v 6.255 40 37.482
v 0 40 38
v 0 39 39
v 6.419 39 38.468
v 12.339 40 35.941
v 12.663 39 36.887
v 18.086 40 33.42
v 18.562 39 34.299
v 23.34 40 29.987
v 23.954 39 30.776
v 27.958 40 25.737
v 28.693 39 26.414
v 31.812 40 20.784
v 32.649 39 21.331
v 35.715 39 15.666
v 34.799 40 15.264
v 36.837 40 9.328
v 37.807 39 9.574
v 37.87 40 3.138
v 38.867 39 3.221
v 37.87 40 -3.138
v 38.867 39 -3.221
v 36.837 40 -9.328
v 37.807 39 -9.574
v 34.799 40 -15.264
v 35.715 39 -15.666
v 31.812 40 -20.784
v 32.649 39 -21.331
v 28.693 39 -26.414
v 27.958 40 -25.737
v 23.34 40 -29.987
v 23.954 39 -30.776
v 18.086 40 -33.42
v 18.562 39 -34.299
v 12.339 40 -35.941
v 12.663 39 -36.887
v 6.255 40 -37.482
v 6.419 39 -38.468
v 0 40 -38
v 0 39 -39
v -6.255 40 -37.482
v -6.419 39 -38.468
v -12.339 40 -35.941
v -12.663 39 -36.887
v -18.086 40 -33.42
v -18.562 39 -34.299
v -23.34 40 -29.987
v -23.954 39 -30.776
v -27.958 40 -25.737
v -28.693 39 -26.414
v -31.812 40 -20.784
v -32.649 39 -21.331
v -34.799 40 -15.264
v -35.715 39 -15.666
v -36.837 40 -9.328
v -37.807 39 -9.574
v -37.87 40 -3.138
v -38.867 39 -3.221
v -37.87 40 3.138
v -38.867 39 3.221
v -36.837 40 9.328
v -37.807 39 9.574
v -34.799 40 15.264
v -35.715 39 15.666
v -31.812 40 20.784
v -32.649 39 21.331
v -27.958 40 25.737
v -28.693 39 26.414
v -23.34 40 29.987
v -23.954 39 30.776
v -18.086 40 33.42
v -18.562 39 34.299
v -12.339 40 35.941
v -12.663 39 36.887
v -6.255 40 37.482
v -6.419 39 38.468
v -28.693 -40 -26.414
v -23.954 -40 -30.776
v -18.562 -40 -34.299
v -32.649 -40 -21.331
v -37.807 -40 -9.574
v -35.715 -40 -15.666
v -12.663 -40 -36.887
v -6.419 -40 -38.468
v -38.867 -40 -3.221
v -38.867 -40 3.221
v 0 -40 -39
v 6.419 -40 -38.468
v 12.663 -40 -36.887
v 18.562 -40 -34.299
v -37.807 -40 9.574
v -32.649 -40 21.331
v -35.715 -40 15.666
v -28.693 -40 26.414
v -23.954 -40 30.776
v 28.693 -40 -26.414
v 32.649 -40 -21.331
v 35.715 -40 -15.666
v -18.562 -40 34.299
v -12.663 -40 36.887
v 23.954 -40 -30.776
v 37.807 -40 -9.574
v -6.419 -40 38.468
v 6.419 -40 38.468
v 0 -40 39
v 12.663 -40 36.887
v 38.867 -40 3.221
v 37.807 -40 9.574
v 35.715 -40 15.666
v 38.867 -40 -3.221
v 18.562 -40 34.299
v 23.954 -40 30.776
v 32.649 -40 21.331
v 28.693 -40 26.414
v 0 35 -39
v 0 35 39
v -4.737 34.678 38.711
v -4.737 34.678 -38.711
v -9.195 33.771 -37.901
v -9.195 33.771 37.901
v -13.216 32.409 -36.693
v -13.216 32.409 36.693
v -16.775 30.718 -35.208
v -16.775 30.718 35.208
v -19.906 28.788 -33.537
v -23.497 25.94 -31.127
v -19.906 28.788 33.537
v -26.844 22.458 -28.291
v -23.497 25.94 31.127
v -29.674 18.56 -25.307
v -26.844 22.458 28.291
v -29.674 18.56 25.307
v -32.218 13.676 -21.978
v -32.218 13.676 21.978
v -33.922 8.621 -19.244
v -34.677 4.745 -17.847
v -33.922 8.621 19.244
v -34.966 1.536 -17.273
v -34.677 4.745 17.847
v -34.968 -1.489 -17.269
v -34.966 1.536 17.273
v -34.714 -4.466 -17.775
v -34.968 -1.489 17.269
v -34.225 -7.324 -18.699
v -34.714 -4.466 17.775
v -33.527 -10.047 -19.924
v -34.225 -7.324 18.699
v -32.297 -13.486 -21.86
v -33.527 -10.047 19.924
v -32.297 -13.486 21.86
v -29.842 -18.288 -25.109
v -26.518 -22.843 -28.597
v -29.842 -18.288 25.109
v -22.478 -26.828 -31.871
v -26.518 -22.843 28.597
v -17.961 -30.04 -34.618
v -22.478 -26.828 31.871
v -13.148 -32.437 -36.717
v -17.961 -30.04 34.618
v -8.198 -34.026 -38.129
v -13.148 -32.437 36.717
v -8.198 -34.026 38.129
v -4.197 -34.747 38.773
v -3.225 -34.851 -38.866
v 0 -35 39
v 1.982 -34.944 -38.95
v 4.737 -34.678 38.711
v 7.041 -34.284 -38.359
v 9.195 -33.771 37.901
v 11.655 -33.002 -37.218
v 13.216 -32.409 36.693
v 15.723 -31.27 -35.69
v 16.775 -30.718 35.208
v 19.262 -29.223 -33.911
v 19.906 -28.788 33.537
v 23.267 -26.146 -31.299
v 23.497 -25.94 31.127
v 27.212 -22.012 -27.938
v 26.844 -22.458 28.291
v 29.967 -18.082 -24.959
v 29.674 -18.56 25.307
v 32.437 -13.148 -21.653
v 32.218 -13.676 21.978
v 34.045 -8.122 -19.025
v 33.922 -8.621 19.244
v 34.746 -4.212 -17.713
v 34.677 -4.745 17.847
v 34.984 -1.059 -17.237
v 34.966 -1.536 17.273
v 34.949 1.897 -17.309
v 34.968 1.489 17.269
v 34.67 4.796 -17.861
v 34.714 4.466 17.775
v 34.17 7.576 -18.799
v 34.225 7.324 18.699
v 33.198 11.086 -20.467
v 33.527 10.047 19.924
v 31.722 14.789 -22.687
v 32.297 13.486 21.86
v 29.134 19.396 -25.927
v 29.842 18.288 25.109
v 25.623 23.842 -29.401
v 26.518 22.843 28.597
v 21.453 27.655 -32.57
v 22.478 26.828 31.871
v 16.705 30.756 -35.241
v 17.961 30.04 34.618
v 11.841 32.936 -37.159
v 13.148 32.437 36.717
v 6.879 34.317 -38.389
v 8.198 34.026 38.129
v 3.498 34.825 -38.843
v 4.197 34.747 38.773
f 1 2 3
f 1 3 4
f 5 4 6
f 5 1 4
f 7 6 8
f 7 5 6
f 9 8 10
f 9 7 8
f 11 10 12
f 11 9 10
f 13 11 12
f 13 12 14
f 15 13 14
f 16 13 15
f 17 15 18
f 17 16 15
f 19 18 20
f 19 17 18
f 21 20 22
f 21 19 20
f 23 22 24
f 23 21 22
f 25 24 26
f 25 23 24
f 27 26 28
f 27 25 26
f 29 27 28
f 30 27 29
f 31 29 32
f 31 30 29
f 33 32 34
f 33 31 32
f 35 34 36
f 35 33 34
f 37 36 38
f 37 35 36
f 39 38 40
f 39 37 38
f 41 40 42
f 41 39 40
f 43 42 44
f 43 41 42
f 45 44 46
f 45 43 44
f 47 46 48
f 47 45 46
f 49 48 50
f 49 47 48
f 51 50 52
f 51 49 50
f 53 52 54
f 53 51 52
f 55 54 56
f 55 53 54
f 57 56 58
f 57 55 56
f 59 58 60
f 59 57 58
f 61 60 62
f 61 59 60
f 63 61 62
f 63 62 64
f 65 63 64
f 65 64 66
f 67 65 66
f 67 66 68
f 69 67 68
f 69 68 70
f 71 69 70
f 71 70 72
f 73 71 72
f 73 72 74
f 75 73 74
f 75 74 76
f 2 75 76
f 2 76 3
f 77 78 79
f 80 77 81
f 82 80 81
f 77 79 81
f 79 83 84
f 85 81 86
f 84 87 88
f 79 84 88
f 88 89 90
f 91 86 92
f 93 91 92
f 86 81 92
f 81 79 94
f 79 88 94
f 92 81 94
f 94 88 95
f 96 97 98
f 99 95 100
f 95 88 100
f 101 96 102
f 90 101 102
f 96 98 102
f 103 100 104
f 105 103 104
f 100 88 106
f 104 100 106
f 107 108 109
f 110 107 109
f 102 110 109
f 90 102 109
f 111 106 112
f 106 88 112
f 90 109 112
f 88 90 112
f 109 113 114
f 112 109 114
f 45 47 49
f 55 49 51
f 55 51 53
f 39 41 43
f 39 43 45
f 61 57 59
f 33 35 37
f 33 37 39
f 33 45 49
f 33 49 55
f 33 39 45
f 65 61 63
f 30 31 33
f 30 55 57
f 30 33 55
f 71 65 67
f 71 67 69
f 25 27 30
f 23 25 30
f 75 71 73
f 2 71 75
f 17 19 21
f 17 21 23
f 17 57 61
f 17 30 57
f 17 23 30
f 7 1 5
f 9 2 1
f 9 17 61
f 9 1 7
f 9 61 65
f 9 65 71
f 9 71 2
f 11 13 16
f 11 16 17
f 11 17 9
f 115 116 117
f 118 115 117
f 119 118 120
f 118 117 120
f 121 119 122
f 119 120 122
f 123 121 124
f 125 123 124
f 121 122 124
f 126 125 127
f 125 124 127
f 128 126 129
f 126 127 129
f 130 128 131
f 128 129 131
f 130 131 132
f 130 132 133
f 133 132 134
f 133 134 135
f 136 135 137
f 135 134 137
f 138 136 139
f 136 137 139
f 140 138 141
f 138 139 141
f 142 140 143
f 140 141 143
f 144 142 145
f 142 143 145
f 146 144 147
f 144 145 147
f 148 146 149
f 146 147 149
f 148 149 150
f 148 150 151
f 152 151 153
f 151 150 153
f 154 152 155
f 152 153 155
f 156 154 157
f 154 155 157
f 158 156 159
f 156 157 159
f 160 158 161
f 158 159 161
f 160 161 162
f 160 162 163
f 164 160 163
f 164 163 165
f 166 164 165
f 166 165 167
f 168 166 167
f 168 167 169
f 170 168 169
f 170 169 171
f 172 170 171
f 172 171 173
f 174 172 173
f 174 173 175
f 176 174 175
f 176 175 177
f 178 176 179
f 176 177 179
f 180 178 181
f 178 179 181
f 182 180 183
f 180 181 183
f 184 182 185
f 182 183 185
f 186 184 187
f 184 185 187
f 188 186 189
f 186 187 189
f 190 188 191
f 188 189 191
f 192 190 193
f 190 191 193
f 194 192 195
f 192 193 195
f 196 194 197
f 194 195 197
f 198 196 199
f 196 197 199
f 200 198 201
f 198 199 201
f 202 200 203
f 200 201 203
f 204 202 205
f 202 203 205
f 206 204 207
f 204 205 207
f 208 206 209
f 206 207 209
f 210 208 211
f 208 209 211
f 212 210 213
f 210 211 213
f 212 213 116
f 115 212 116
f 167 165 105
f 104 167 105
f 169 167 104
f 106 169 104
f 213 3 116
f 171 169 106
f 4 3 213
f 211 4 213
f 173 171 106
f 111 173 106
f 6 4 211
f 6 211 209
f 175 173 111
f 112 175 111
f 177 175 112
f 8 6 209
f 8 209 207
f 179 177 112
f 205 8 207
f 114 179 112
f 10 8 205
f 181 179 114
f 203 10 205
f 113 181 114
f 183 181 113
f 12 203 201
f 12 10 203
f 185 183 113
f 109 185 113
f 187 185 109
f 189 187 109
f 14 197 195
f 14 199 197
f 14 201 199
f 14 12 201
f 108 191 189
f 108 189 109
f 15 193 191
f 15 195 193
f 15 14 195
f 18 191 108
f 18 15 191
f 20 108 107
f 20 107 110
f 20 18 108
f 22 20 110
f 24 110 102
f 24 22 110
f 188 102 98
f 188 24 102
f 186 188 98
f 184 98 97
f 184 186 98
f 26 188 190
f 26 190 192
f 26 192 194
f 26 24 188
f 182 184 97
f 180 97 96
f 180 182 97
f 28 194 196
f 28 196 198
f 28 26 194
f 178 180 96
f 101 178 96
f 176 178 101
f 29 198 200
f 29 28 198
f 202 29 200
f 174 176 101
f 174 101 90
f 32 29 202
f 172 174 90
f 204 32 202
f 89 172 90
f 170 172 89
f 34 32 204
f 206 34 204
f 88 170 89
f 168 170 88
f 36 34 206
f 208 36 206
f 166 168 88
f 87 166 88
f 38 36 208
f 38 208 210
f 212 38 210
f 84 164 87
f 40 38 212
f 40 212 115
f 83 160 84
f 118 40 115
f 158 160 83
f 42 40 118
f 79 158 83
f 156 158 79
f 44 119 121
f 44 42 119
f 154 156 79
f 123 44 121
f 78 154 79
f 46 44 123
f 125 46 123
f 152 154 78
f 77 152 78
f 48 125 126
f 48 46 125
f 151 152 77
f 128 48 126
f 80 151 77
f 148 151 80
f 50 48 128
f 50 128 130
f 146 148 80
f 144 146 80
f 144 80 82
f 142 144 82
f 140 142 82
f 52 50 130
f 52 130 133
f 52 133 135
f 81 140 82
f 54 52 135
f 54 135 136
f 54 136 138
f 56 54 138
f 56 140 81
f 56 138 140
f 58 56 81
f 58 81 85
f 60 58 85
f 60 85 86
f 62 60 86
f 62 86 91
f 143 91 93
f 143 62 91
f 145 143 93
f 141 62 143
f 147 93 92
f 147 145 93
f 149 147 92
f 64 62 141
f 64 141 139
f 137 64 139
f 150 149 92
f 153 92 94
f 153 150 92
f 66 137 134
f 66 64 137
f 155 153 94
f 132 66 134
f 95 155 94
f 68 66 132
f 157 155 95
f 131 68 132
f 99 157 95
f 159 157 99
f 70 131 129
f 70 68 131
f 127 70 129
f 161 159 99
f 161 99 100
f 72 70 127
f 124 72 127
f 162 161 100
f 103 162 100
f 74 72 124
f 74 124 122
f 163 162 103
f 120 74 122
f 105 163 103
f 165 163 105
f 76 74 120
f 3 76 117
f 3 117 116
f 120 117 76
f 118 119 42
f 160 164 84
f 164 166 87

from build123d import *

# Parameters (mm, degrees)
SCHIZZO1_R        = 39
ESTRUSIONE1_DEPTH = 40
SCHIZZO3_R        = 35
ESTRUSIONE3_DEPTH = 40
SMUSSO1_SIZE      = 1


with BuildPart() as part:
    # Schizzo1 → Estrusione1 (new, symmetric)
    with BuildSketch(Plane(origin=(0, 0, 0), x_dir=(1, 0, 0), z_dir=(0, 1, 0))):
        with Locations(Location((0, 0, 0), (0, 0, 270))):
            Circle(SCHIZZO1_R)
    extrude(amount=ESTRUSIONE1_DEPTH, both=True)

    # Schizzo3 → Estrusione3 (cut, symmetric)
    with BuildSketch(Plane.XY):
        with Locations(Location((0, 0, 0), (0, 0, 90))):
            Circle(SCHIZZO3_R)
    extrude(amount=ESTRUSIONE3_DEPTH, both=True, mode=Mode.SUBTRACT)

    # Smusso1
    smusso1_edges = [part.edges().sort_by_distance(p)[0] for p in [
        (0, 40, -39),
    ]]
    chamfer(smusso1_edges, length=SMUSSO1_SIZE)


solid = part.part
